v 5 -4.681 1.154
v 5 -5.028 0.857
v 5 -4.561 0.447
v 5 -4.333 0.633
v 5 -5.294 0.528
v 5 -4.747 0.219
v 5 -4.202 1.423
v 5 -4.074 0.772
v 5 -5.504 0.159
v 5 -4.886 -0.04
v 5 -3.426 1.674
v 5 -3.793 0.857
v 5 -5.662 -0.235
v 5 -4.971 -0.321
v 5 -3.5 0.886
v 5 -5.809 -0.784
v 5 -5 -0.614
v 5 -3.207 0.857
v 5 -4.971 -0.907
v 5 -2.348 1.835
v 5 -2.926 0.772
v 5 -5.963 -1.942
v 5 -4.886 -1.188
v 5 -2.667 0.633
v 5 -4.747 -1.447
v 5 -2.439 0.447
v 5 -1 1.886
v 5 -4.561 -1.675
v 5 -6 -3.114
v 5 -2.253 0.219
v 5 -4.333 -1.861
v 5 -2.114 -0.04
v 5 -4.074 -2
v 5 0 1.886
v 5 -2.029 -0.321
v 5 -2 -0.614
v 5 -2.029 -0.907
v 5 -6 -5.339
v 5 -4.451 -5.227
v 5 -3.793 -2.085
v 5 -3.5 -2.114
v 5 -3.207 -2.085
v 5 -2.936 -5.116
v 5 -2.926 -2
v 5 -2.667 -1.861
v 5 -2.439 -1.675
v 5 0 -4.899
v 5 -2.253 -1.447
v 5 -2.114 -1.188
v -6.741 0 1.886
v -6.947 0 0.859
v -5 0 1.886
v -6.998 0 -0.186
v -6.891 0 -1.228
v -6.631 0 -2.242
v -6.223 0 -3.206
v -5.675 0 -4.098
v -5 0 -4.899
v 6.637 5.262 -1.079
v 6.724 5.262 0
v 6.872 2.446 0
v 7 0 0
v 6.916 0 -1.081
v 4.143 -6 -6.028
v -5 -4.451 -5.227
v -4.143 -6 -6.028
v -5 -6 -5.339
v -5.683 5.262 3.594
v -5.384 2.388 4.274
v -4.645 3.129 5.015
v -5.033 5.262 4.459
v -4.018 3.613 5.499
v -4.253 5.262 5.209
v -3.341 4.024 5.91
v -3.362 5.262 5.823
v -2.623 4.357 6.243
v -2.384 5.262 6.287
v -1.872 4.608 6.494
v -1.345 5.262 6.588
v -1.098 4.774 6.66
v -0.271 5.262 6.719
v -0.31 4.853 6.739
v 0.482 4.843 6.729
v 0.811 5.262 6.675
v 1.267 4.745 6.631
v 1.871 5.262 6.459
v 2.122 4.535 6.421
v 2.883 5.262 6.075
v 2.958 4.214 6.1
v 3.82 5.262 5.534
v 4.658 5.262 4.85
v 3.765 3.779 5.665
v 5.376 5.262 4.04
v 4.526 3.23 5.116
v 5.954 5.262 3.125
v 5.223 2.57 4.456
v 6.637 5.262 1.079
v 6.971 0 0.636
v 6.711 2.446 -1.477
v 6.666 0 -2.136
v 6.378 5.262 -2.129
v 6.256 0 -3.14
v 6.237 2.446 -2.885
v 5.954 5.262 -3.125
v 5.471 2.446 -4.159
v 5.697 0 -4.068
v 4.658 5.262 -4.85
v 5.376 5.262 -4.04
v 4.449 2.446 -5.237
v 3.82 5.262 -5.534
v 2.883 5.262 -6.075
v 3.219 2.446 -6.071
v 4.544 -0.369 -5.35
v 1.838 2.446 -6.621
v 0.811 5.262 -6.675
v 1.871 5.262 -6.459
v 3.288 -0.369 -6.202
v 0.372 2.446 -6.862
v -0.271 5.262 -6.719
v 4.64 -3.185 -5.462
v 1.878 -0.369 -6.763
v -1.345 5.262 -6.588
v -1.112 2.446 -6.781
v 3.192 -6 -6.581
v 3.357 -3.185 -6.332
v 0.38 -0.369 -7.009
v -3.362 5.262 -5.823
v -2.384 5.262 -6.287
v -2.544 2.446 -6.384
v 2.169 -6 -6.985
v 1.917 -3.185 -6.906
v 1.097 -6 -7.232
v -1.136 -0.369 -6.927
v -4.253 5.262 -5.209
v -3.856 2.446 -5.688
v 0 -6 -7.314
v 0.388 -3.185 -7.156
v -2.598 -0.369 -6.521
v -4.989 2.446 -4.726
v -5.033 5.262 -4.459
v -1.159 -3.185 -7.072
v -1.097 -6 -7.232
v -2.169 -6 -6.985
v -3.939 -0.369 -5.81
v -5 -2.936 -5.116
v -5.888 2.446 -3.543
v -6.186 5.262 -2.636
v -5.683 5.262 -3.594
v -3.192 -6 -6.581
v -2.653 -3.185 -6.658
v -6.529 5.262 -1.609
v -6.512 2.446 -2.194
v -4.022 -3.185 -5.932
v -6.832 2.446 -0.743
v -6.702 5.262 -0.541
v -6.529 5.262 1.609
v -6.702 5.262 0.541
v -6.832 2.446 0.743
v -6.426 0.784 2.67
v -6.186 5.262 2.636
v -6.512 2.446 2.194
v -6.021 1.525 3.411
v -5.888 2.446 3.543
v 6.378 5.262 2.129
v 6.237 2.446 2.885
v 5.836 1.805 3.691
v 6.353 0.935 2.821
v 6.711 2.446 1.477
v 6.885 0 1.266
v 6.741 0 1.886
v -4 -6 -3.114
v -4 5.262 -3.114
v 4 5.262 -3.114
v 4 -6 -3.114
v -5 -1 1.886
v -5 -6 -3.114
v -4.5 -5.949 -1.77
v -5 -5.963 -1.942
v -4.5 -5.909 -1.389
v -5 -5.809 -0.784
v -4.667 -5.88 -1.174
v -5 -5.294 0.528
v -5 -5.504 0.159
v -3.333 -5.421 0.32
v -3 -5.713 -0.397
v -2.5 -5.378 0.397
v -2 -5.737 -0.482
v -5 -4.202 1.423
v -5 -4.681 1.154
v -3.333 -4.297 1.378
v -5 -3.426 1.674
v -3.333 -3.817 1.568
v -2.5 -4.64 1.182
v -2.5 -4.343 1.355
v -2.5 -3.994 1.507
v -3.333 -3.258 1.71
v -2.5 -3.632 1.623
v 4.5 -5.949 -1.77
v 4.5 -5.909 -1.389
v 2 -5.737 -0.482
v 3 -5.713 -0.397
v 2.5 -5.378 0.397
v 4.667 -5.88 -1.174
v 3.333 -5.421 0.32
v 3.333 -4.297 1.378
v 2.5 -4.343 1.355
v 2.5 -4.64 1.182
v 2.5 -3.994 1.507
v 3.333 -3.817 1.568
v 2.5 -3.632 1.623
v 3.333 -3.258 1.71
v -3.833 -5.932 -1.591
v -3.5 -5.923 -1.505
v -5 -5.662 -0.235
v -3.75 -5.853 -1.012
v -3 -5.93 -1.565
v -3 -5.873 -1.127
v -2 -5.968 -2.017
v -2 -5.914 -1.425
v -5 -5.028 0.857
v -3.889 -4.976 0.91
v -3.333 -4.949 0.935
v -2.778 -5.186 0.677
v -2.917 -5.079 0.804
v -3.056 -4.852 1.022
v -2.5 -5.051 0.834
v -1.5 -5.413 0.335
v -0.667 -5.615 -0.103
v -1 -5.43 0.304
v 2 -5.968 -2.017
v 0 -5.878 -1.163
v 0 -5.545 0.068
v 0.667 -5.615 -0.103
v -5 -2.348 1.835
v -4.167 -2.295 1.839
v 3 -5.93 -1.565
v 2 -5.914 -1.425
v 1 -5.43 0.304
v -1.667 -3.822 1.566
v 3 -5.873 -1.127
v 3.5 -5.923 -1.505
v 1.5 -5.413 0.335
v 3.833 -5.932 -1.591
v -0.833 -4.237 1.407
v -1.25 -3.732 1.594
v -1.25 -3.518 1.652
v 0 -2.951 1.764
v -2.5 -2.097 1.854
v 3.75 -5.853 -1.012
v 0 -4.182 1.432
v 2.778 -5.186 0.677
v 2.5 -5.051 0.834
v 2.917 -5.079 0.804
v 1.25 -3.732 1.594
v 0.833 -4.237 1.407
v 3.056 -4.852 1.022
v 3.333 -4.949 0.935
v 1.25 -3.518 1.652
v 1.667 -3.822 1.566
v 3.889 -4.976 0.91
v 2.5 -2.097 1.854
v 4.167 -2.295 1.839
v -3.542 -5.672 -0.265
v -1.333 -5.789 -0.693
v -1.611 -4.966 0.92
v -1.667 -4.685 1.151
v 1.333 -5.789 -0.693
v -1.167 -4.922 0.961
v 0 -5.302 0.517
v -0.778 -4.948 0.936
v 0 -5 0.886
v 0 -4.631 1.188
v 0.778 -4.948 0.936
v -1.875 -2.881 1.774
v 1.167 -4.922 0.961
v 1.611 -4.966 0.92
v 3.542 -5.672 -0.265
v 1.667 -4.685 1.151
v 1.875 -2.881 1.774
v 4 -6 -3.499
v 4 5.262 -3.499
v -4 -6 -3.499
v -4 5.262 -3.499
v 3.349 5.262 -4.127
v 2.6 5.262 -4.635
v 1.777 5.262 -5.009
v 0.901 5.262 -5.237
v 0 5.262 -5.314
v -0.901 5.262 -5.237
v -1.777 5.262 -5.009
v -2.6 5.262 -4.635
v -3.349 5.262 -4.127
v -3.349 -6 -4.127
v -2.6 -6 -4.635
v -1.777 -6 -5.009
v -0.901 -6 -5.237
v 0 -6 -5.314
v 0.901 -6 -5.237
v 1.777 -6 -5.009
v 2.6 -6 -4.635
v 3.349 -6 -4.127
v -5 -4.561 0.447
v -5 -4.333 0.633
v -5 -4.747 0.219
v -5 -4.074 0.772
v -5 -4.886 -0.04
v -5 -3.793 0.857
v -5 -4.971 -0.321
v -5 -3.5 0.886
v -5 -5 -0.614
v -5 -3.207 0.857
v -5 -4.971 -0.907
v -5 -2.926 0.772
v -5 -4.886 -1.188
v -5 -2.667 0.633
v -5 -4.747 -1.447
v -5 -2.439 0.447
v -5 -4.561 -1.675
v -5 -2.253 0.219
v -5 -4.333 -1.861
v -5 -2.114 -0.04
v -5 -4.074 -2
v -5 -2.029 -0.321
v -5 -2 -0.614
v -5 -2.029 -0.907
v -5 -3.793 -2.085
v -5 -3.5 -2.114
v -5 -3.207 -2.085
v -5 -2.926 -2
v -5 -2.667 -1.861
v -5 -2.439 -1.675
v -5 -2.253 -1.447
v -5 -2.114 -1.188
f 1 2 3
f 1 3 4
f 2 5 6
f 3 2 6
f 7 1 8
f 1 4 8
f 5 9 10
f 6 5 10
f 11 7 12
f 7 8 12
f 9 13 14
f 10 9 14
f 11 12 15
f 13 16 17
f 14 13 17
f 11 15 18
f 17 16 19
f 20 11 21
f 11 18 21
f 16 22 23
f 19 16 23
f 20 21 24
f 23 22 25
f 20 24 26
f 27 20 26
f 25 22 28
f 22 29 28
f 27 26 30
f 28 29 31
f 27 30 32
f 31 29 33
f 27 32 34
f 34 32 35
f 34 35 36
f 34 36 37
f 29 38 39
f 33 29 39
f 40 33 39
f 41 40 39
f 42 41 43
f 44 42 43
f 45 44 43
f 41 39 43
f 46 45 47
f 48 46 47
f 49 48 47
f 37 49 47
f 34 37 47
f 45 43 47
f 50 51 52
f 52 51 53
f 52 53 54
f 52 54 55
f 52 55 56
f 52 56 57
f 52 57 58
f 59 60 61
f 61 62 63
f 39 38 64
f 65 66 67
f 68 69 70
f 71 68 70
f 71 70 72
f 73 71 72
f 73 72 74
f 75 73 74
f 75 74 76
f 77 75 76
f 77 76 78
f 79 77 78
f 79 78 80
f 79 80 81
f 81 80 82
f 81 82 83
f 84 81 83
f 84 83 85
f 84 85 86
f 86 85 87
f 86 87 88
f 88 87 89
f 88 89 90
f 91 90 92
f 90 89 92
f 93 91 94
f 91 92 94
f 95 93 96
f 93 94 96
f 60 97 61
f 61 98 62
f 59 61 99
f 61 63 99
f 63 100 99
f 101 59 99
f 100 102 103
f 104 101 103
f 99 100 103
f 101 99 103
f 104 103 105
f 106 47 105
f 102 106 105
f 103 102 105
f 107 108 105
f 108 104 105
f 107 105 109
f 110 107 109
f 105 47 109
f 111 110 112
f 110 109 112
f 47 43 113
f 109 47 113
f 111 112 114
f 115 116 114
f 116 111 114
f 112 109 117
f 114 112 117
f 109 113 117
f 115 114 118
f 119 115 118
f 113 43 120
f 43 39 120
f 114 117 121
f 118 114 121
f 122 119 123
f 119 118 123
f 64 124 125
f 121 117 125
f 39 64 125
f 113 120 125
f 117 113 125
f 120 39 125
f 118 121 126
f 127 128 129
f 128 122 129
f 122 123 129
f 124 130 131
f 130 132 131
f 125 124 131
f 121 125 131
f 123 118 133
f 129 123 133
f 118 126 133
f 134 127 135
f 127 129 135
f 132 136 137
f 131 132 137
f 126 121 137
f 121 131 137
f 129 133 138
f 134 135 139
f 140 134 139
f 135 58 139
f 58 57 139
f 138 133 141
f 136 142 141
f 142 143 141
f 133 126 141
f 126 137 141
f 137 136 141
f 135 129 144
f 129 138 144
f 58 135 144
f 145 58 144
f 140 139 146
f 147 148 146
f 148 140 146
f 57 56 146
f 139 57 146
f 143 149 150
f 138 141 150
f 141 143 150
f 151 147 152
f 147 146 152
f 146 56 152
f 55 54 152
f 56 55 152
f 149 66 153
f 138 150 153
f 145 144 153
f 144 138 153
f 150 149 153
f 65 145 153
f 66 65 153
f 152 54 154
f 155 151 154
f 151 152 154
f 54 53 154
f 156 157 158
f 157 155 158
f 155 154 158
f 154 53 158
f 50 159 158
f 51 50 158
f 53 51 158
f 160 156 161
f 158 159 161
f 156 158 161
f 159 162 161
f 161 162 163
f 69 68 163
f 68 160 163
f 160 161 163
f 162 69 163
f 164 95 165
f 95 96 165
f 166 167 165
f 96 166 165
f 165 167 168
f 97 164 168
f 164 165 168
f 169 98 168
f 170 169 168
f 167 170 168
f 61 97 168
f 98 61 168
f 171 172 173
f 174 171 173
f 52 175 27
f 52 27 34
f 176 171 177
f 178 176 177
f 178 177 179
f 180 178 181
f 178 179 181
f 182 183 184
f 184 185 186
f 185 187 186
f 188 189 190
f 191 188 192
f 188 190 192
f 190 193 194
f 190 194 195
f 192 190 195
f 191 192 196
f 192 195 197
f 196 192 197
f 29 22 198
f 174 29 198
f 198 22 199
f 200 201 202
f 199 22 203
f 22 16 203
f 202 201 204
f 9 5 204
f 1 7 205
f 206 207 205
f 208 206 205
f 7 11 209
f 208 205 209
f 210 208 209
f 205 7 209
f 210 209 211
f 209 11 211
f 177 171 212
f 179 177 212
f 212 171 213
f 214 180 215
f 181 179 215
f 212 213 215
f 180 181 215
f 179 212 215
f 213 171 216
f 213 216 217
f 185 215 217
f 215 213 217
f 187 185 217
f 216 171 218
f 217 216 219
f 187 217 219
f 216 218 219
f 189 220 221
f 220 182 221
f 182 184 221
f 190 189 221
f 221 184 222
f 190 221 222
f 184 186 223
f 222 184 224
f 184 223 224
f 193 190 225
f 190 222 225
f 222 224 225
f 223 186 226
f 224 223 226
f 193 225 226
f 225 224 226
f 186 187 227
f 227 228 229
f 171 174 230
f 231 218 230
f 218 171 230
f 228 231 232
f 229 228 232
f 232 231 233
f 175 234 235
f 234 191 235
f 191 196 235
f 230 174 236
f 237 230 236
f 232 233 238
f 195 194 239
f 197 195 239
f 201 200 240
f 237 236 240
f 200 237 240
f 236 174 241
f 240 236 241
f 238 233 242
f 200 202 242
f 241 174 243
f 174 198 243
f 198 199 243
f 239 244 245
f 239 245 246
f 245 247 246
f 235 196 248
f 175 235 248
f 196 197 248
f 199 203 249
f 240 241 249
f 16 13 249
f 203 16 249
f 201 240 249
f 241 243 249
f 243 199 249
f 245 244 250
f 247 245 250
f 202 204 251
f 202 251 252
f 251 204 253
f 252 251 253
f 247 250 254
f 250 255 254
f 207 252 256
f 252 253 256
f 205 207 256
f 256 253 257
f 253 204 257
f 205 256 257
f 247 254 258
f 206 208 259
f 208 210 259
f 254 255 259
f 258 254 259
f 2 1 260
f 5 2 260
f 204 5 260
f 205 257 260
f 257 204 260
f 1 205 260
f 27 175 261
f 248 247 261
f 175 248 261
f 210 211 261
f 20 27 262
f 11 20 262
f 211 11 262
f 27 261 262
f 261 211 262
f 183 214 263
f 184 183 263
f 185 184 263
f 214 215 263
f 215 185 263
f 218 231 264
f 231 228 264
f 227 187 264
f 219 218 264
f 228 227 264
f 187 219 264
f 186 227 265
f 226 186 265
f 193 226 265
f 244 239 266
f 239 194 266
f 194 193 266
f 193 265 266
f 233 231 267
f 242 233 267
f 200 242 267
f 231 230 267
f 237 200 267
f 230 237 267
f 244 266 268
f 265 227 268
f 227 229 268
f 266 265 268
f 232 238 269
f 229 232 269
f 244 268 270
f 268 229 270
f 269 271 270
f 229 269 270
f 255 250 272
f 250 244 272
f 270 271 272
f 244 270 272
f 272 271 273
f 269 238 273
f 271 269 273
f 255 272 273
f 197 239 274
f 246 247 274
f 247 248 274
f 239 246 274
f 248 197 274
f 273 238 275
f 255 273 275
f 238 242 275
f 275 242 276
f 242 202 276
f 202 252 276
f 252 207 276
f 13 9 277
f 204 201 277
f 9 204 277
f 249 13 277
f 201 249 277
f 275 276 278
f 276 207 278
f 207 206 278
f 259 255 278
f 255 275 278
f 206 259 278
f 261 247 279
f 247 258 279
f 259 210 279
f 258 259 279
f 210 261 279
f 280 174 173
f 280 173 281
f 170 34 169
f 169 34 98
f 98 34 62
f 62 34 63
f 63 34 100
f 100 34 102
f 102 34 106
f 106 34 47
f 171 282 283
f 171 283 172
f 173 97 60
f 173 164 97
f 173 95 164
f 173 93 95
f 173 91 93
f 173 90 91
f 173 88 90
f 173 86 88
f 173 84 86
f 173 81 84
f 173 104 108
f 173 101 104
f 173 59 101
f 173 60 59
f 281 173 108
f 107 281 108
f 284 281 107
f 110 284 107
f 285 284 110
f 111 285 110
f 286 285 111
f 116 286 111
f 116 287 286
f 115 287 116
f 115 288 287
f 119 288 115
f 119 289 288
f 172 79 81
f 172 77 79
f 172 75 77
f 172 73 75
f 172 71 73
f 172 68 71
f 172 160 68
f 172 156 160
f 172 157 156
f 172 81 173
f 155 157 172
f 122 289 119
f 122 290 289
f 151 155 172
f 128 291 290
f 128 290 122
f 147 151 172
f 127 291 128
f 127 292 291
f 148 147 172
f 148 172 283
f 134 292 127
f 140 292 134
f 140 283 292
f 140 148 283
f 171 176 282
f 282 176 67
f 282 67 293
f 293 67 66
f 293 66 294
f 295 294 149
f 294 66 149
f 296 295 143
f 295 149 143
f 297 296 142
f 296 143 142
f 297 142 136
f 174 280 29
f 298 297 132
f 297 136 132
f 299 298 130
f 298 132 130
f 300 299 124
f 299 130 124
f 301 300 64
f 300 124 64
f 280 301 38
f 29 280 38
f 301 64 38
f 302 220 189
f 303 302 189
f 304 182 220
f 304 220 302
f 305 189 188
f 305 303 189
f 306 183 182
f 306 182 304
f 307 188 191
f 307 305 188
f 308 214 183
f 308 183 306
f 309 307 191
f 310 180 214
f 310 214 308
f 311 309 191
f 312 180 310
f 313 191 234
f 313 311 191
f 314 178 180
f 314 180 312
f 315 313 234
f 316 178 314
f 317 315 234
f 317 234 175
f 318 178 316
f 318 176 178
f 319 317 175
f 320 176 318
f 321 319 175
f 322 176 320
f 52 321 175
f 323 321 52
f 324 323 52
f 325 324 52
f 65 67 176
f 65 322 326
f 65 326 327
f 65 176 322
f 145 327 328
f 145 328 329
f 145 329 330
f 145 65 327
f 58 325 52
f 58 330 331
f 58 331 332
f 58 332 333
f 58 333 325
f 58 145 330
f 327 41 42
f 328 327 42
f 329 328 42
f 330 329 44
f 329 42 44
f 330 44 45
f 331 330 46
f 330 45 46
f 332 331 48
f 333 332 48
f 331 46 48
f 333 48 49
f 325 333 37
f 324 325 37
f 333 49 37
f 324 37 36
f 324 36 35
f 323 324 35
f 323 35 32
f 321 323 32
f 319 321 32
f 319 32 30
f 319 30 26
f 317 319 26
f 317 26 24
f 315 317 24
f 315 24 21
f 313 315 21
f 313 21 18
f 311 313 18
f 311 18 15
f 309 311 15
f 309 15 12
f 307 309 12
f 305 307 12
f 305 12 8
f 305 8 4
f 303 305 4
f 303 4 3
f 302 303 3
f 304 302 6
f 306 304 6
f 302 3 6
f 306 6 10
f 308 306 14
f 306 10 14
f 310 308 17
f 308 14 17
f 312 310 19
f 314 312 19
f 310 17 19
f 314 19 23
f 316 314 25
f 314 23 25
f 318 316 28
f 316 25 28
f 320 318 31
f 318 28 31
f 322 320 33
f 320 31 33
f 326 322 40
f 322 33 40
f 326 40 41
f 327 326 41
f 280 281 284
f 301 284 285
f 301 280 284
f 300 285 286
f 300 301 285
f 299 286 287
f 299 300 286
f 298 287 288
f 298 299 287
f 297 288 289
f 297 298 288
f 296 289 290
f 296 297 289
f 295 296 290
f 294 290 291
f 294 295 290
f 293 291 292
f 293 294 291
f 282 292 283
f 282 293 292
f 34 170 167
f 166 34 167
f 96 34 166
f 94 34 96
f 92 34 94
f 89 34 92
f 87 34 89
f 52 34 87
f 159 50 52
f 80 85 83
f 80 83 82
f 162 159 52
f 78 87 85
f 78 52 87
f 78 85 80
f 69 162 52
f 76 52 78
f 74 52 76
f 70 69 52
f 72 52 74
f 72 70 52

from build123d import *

# Parameters (mm, degrees)
SKETCH1_R                     = 7
BOSS_EXTRUDE1_DEPTH           = 15
BOSS_EXTRUDE1_TAPER           = 3
BOSS_EXTRUDE1_OTHER_WAY_DEPTH = 6
BOSS_EXTRUDE1_OTHER_WAY_TAPER = -3
CUT_EXTRUDE1_DEPTH            = 19.220929184
CUT_EXTRUDE1_DEPTH_BACK       = 19.220929184
CUT_EXTRUDE2_START            = -9.200504543
CUT_EXTRUDE2_OUTLINE_W        = 6.502745185
CUT_EXTRUDE2_OUTLINE_H        = 6
CUT_EXTRUDE2_DEPTH            = 9.200504543
SKETCH5_R                     = 1.5
CUT_EXTRUDE3_DEPTH            = 21.554832283
FILLET1_SIZE                  = 5
CUT_EXTRUDE4_DEPTH            = 19.096992379
CUT_EXTRUDE4_DEPTH_BACK       = 19.096992379
SKETCH6_W                     = 14.909790155
SKETCH6_H                     = 10.479187812
CUT_EXTRUDE5_DEPTH            = 16.143532008


with BuildPart() as part:
    # Sketch1 → Boss-Extrude1 (new body)
    with BuildSketch(Plane(origin=(0, 0, 0), x_dir=(1, 0, 0), z_dir=(0, 1, 0))):
        Circle(SKETCH1_R)
    extrude(amount=BOSS_EXTRUDE1_DEPTH, taper=BOSS_EXTRUDE1_TAPER)

    # Sketch1 → Boss-Extrude1 other way (add)
    with BuildSketch(Plane(origin=(0, 0, 0), x_dir=(1, 0, 0), z_dir=(0, 1, 0))):
        Circle(SKETCH1_R)
    extrude(amount=-BOSS_EXTRUDE1_OTHER_WAY_DEPTH, taper=BOSS_EXTRUDE1_OTHER_WAY_TAPER)

    # Sketch3 → Cut-Extrude1 (cut, two sides: drawn at the far end of the back side and taken through both)
    with BuildSketch(Plane(origin=(0, 0, 0), x_dir=(0, 0, -1), z_dir=(1, 0, 0)).offset(-CUT_EXTRUDE1_DEPTH_BACK)):
        Polygon((-1.886057768, -6), (-1.886057768, 0), (-9.929766736, 8.043708969), (-9.929766736, -6), align=None)
    extrude(amount=CUT_EXTRUDE1_DEPTH + CUT_EXTRUDE1_DEPTH_BACK, mode=Mode.SUBTRACT)

    # Cut-Extrude2: read off the stored shape, not the designer's step
    # Cut-Extrude2 outline → Cut-Extrude2 (cut)
    with BuildSketch(Plane.XY.offset(1.886057768).offset(CUT_EXTRUDE2_START)):
        with Locations((-8.251372593, -3)):
            Rectangle(CUT_EXTRUDE2_OUTLINE_W, CUT_EXTRUDE2_OUTLINE_H)
        with Locations((8.251372593, -3)):
            Rectangle(CUT_EXTRUDE2_OUTLINE_W, CUT_EXTRUDE2_OUTLINE_H)
    extrude(amount=CUT_EXTRUDE2_DEPTH, mode=Mode.SUBTRACT)

    # Sketch5 → Cut-Extrude3 (cut, through all)
    with BuildSketch(Plane(origin=(5, 0, 0), x_dir=(0, 0, -1), z_dir=(1, 0, 0))):
        with Locations((0.613942232, -3.5)):
            Circle(SKETCH5_R)
    extrude(amount=-CUT_EXTRUDE3_DEPTH, mode=Mode.SUBTRACT)

    # Fillet1
    # a fillet whose section is not a circle: 5 mm, written as the material it takes off along each edge
    with BuildSketch(Plane(origin=(17.5, -6, 1.886057768), x_dir=(0, 0, -1), z_dir=(-1, 0, 0))) as fillet1_piece_1:
        with BuildLine():
            Bezier((FILLET1_SIZE, 0), (0, 0), (0, -FILLET1_SIZE), weights=[1, 1.5, 1])
            Line((0, -FILLET1_SIZE), (0, 0))
            Line((0, 0), (FILLET1_SIZE, 0))
        make_face()
    extrude(amount=35, mode=Mode.SUBTRACT)

    # Fillet2
    # a fillet whose section is not a circle: 10, 5 mm, written as the material it takes off along each edge
    with BuildSketch(Plane(origin=(0, 15, 0), x_dir=(1, 0, 0), z_dir=(0, 0, -1))) as fillet2_piece_1:
        with BuildLine():
            Bezier((6.724247047, 9.738320219), (6.213883311, 0), (1.731099374, 0), weights=[1, 0.818181818, 1])
            Line((1.731099374, 0), (6.213883311, 0))
            Line((6.213883311, 0), (6.724247047, 9.738320219))
        make_face()
    revolve(axis=Axis((0, 15, 0), (0, -1, 0)), mode=Mode.SUBTRACT)

    # Sketch6 → Cut-Extrude4 (cut, two sides: drawn at the far end of the back side and taken through both)
    with BuildSketch(Plane(origin=(0, 0, 0), x_dir=(0, 0, -1), z_dir=(1, 0, 0)).offset(-CUT_EXTRUDE4_DEPTH_BACK)):
        with Locations((0.730648031, 10.501273687)):
            Rectangle(SKETCH6_W, SKETCH6_H)
    extrude(amount=CUT_EXTRUDE4_DEPTH + CUT_EXTRUDE4_DEPTH_BACK, mode=Mode.SUBTRACT)

    # Sketch7 → Cut-Extrude5 (cut, through all)
    with BuildSketch(Plane.XZ.offset(6)):
        with BuildLine():
            Line((4, -3.113942232), (4, -3.499048938))
            ThreePointArc((4, -3.499048938), (0, -5.314446676), (-4, -3.499048938))
            Line((-4, -3.499048938), (-4, -3.113942232))
            Line((-4, -3.113942232), (4, -3.113942232))
        make_face()
    extrude(amount=-CUT_EXTRUDE5_DEPTH, mode=Mode.SUBTRACT)


solid = part.part
